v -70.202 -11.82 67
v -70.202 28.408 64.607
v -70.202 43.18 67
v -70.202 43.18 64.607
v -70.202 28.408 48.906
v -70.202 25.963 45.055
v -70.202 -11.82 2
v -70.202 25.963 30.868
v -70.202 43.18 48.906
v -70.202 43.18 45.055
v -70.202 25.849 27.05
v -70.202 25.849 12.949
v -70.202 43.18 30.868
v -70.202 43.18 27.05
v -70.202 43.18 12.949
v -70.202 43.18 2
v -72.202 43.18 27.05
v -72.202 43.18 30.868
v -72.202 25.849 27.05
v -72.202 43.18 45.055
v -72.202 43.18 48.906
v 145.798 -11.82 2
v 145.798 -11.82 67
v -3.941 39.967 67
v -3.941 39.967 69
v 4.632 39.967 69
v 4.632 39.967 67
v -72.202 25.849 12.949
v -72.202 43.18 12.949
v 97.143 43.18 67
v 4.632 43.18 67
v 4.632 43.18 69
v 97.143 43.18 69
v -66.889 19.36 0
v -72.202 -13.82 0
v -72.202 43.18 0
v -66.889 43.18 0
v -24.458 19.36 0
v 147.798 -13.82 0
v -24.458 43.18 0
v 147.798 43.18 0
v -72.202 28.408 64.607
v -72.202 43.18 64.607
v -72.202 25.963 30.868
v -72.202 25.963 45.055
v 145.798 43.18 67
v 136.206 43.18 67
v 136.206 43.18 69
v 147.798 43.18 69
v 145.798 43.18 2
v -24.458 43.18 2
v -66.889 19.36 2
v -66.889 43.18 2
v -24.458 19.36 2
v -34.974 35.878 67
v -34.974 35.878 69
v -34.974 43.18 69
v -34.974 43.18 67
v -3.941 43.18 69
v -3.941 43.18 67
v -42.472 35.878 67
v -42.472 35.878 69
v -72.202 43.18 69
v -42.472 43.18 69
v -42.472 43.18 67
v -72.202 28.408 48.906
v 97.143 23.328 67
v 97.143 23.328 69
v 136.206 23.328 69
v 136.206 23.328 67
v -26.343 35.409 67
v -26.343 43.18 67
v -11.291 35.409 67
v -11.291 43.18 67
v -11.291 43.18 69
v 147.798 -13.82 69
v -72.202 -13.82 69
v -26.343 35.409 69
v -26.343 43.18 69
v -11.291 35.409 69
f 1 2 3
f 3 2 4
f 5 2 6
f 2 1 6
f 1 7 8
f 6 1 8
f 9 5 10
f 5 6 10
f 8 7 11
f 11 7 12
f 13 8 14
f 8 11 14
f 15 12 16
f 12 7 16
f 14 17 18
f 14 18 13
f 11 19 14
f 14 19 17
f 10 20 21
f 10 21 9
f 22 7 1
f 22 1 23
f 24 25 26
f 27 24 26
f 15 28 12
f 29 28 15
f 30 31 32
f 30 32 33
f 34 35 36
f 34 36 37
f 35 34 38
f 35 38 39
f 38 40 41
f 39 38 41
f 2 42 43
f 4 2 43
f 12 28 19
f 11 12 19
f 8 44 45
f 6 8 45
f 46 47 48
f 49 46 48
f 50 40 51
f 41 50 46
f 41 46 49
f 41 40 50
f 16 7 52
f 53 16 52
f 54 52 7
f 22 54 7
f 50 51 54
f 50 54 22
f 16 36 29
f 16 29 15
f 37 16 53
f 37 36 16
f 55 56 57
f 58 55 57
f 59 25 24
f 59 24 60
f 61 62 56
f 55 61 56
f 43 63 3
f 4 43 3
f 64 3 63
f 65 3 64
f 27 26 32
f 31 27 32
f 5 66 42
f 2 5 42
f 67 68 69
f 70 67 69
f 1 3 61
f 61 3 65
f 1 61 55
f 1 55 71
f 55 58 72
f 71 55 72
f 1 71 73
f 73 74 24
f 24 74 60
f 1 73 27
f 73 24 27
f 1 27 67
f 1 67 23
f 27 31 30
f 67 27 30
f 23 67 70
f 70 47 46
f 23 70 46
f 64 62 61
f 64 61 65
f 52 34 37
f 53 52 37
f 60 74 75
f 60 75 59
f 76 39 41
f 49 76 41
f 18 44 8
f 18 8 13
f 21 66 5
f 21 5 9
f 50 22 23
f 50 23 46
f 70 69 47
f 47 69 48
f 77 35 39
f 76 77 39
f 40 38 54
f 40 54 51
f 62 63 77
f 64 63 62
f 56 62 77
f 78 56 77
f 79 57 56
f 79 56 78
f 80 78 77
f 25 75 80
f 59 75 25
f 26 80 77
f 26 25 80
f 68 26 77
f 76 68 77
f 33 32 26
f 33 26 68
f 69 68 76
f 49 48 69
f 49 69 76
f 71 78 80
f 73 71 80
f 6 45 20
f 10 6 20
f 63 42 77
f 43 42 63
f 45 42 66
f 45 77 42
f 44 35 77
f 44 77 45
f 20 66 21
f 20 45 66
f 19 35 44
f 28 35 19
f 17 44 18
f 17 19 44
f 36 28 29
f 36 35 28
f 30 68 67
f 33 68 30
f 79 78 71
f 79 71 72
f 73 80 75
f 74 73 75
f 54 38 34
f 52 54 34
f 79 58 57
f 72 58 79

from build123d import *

# Parameters (mm, degrees)
ESQUISSE1_W            = 220
ESQUISSE1_H            = 57
BOSS_EXTRU_1_DEPTH     = 69
COQUE1_T               = -2
ESQUISSE2_W            = 42.430934458
ESQUISSE2_H            = 23.81944652
TROU_CABLES_DEPTH      = 10
ESQUISSE4_W            = 39.063130892
ESQUISSE4_H            = 19.851704837
TROU_BORNIER_DEPTH     = 10
ESQUISSE5_W            = 15.700605502
ESQUISSE5_H            = 14.772120087
TROU_RASPBERRY_1_DEPTH = 10
ESQUISSE6_W            = 14.187422576
ESQUISSE6_H            = 17.21673515
TROU_RASPBERRY_2_DEPTH = 10
ESQUISSE7_W            = 14.101040577
ESQUISSE7_H            = 17.33071114
TROU_RASPBERRY_3_DEPTH = 10
ESQUISSE8_W            = 7.498357612
ESQUISSE8_H            = 7.301962728
TROU_RASPBERRY_4_DEPTH = 10
ESQUISSE9_W            = 15.051909722
ESQUISSE9_H            = 7.770311475
TROU_RASPBERRY_5_DEPTH = 10
ESQUISSE10_W           = 8.572607217
ESQUISSE10_H           = 3.212302761
TROU_RASPBERRY_6_DEPTH = 10


with BuildPart() as part:
    # Esquisse1 → Boss.-Extru.1 (new body)
    with BuildSketch(Plane.XY):
        with Locations((37.797752809, 14.679775281)):
            Rectangle(ESQUISSE1_W, ESQUISSE1_H)
    extrude(amount=BOSS_EXTRU_1_DEPTH)

    # Coque1
    coque1_openings = [part.faces().sort_by_distance(p)[0] for p in [
        (37.797752809, 43.179775281, 34.5),
    ]]
    offset(amount=COQUE1_T, openings=coque1_openings, kind=Kind.INTERSECTION)

    # Esquisse2 → Trou cables (cut)
    with BuildSketch(Plane(origin=(0, 0, 0), x_dir=(-1, 0, 0), z_dir=(0, 0, -1))):
        with Locations((45.673767677, 31.270052021)):
            Rectangle(ESQUISSE2_W, ESQUISSE2_H)
    extrude(amount=-TROU_CABLES_DEPTH, mode=Mode.SUBTRACT)

    # Esquisse4 → trou bornier (cut)
    with BuildSketch(Plane.XY.offset(69)):
        with Locations((116.674495492, 33.253922863)):
            Rectangle(ESQUISSE4_W, ESQUISSE4_H)
    extrude(amount=-TROU_BORNIER_DEPTH, mode=Mode.SUBTRACT)

    # Esquisse5 → trou raspberry 1 (cut)
    with BuildSketch(Plane.ZY.offset(72.202247191)):
        with Locations((56.756295127, 35.793715238)):
            Rectangle(ESQUISSE5_W, ESQUISSE5_H)
    extrude(amount=-TROU_RASPBERRY_1_DEPTH, mode=Mode.SUBTRACT)

    # Esquisse6 → trou raspberry 2 (cut)
    with BuildSketch(Plane.ZY.offset(72.202247191)):
        with Locations((37.961253625, 34.571407706)):
            Rectangle(ESQUISSE6_W, ESQUISSE6_H)
    extrude(amount=-TROU_RASPBERRY_2_DEPTH, mode=Mode.SUBTRACT)

    # Esquisse7 → trou raspberry 3 (cut)
    with BuildSketch(Plane.ZY.offset(72.202247191)):
        with Locations((19.999072944, 34.514419711)):
            Rectangle(ESQUISSE7_W, ESQUISSE7_H)
    extrude(amount=-TROU_RASPBERRY_3_DEPTH, mode=Mode.SUBTRACT)

    # Esquisse8 → trou raspberry 4 (cut)
    with BuildSketch(Plane.XY.offset(69)):
        with Locations((-38.723319171, 39.528793917)):
            Rectangle(ESQUISSE8_W, ESQUISSE8_H)
    extrude(amount=-TROU_RASPBERRY_4_DEPTH, mode=Mode.SUBTRACT)

    # Esquisse9 → trou raspberry 5 (cut)
    with BuildSketch(Plane.XY.offset(69)):
        with Locations((-18.817046732, 39.294619544)):
            Rectangle(ESQUISSE9_W, ESQUISSE9_H)
    extrude(amount=-TROU_RASPBERRY_5_DEPTH, mode=Mode.SUBTRACT)

    # Esquisse10 → trou raspberry 6 (cut)
    with BuildSketch(Plane.XY.offset(69)):
        with Locations((0.345482943, 41.573623901)):
            Rectangle(ESQUISSE10_W, ESQUISSE10_H)
    extrude(amount=-TROU_RASPBERRY_6_DEPTH, mode=Mode.SUBTRACT)


solid = part.part
